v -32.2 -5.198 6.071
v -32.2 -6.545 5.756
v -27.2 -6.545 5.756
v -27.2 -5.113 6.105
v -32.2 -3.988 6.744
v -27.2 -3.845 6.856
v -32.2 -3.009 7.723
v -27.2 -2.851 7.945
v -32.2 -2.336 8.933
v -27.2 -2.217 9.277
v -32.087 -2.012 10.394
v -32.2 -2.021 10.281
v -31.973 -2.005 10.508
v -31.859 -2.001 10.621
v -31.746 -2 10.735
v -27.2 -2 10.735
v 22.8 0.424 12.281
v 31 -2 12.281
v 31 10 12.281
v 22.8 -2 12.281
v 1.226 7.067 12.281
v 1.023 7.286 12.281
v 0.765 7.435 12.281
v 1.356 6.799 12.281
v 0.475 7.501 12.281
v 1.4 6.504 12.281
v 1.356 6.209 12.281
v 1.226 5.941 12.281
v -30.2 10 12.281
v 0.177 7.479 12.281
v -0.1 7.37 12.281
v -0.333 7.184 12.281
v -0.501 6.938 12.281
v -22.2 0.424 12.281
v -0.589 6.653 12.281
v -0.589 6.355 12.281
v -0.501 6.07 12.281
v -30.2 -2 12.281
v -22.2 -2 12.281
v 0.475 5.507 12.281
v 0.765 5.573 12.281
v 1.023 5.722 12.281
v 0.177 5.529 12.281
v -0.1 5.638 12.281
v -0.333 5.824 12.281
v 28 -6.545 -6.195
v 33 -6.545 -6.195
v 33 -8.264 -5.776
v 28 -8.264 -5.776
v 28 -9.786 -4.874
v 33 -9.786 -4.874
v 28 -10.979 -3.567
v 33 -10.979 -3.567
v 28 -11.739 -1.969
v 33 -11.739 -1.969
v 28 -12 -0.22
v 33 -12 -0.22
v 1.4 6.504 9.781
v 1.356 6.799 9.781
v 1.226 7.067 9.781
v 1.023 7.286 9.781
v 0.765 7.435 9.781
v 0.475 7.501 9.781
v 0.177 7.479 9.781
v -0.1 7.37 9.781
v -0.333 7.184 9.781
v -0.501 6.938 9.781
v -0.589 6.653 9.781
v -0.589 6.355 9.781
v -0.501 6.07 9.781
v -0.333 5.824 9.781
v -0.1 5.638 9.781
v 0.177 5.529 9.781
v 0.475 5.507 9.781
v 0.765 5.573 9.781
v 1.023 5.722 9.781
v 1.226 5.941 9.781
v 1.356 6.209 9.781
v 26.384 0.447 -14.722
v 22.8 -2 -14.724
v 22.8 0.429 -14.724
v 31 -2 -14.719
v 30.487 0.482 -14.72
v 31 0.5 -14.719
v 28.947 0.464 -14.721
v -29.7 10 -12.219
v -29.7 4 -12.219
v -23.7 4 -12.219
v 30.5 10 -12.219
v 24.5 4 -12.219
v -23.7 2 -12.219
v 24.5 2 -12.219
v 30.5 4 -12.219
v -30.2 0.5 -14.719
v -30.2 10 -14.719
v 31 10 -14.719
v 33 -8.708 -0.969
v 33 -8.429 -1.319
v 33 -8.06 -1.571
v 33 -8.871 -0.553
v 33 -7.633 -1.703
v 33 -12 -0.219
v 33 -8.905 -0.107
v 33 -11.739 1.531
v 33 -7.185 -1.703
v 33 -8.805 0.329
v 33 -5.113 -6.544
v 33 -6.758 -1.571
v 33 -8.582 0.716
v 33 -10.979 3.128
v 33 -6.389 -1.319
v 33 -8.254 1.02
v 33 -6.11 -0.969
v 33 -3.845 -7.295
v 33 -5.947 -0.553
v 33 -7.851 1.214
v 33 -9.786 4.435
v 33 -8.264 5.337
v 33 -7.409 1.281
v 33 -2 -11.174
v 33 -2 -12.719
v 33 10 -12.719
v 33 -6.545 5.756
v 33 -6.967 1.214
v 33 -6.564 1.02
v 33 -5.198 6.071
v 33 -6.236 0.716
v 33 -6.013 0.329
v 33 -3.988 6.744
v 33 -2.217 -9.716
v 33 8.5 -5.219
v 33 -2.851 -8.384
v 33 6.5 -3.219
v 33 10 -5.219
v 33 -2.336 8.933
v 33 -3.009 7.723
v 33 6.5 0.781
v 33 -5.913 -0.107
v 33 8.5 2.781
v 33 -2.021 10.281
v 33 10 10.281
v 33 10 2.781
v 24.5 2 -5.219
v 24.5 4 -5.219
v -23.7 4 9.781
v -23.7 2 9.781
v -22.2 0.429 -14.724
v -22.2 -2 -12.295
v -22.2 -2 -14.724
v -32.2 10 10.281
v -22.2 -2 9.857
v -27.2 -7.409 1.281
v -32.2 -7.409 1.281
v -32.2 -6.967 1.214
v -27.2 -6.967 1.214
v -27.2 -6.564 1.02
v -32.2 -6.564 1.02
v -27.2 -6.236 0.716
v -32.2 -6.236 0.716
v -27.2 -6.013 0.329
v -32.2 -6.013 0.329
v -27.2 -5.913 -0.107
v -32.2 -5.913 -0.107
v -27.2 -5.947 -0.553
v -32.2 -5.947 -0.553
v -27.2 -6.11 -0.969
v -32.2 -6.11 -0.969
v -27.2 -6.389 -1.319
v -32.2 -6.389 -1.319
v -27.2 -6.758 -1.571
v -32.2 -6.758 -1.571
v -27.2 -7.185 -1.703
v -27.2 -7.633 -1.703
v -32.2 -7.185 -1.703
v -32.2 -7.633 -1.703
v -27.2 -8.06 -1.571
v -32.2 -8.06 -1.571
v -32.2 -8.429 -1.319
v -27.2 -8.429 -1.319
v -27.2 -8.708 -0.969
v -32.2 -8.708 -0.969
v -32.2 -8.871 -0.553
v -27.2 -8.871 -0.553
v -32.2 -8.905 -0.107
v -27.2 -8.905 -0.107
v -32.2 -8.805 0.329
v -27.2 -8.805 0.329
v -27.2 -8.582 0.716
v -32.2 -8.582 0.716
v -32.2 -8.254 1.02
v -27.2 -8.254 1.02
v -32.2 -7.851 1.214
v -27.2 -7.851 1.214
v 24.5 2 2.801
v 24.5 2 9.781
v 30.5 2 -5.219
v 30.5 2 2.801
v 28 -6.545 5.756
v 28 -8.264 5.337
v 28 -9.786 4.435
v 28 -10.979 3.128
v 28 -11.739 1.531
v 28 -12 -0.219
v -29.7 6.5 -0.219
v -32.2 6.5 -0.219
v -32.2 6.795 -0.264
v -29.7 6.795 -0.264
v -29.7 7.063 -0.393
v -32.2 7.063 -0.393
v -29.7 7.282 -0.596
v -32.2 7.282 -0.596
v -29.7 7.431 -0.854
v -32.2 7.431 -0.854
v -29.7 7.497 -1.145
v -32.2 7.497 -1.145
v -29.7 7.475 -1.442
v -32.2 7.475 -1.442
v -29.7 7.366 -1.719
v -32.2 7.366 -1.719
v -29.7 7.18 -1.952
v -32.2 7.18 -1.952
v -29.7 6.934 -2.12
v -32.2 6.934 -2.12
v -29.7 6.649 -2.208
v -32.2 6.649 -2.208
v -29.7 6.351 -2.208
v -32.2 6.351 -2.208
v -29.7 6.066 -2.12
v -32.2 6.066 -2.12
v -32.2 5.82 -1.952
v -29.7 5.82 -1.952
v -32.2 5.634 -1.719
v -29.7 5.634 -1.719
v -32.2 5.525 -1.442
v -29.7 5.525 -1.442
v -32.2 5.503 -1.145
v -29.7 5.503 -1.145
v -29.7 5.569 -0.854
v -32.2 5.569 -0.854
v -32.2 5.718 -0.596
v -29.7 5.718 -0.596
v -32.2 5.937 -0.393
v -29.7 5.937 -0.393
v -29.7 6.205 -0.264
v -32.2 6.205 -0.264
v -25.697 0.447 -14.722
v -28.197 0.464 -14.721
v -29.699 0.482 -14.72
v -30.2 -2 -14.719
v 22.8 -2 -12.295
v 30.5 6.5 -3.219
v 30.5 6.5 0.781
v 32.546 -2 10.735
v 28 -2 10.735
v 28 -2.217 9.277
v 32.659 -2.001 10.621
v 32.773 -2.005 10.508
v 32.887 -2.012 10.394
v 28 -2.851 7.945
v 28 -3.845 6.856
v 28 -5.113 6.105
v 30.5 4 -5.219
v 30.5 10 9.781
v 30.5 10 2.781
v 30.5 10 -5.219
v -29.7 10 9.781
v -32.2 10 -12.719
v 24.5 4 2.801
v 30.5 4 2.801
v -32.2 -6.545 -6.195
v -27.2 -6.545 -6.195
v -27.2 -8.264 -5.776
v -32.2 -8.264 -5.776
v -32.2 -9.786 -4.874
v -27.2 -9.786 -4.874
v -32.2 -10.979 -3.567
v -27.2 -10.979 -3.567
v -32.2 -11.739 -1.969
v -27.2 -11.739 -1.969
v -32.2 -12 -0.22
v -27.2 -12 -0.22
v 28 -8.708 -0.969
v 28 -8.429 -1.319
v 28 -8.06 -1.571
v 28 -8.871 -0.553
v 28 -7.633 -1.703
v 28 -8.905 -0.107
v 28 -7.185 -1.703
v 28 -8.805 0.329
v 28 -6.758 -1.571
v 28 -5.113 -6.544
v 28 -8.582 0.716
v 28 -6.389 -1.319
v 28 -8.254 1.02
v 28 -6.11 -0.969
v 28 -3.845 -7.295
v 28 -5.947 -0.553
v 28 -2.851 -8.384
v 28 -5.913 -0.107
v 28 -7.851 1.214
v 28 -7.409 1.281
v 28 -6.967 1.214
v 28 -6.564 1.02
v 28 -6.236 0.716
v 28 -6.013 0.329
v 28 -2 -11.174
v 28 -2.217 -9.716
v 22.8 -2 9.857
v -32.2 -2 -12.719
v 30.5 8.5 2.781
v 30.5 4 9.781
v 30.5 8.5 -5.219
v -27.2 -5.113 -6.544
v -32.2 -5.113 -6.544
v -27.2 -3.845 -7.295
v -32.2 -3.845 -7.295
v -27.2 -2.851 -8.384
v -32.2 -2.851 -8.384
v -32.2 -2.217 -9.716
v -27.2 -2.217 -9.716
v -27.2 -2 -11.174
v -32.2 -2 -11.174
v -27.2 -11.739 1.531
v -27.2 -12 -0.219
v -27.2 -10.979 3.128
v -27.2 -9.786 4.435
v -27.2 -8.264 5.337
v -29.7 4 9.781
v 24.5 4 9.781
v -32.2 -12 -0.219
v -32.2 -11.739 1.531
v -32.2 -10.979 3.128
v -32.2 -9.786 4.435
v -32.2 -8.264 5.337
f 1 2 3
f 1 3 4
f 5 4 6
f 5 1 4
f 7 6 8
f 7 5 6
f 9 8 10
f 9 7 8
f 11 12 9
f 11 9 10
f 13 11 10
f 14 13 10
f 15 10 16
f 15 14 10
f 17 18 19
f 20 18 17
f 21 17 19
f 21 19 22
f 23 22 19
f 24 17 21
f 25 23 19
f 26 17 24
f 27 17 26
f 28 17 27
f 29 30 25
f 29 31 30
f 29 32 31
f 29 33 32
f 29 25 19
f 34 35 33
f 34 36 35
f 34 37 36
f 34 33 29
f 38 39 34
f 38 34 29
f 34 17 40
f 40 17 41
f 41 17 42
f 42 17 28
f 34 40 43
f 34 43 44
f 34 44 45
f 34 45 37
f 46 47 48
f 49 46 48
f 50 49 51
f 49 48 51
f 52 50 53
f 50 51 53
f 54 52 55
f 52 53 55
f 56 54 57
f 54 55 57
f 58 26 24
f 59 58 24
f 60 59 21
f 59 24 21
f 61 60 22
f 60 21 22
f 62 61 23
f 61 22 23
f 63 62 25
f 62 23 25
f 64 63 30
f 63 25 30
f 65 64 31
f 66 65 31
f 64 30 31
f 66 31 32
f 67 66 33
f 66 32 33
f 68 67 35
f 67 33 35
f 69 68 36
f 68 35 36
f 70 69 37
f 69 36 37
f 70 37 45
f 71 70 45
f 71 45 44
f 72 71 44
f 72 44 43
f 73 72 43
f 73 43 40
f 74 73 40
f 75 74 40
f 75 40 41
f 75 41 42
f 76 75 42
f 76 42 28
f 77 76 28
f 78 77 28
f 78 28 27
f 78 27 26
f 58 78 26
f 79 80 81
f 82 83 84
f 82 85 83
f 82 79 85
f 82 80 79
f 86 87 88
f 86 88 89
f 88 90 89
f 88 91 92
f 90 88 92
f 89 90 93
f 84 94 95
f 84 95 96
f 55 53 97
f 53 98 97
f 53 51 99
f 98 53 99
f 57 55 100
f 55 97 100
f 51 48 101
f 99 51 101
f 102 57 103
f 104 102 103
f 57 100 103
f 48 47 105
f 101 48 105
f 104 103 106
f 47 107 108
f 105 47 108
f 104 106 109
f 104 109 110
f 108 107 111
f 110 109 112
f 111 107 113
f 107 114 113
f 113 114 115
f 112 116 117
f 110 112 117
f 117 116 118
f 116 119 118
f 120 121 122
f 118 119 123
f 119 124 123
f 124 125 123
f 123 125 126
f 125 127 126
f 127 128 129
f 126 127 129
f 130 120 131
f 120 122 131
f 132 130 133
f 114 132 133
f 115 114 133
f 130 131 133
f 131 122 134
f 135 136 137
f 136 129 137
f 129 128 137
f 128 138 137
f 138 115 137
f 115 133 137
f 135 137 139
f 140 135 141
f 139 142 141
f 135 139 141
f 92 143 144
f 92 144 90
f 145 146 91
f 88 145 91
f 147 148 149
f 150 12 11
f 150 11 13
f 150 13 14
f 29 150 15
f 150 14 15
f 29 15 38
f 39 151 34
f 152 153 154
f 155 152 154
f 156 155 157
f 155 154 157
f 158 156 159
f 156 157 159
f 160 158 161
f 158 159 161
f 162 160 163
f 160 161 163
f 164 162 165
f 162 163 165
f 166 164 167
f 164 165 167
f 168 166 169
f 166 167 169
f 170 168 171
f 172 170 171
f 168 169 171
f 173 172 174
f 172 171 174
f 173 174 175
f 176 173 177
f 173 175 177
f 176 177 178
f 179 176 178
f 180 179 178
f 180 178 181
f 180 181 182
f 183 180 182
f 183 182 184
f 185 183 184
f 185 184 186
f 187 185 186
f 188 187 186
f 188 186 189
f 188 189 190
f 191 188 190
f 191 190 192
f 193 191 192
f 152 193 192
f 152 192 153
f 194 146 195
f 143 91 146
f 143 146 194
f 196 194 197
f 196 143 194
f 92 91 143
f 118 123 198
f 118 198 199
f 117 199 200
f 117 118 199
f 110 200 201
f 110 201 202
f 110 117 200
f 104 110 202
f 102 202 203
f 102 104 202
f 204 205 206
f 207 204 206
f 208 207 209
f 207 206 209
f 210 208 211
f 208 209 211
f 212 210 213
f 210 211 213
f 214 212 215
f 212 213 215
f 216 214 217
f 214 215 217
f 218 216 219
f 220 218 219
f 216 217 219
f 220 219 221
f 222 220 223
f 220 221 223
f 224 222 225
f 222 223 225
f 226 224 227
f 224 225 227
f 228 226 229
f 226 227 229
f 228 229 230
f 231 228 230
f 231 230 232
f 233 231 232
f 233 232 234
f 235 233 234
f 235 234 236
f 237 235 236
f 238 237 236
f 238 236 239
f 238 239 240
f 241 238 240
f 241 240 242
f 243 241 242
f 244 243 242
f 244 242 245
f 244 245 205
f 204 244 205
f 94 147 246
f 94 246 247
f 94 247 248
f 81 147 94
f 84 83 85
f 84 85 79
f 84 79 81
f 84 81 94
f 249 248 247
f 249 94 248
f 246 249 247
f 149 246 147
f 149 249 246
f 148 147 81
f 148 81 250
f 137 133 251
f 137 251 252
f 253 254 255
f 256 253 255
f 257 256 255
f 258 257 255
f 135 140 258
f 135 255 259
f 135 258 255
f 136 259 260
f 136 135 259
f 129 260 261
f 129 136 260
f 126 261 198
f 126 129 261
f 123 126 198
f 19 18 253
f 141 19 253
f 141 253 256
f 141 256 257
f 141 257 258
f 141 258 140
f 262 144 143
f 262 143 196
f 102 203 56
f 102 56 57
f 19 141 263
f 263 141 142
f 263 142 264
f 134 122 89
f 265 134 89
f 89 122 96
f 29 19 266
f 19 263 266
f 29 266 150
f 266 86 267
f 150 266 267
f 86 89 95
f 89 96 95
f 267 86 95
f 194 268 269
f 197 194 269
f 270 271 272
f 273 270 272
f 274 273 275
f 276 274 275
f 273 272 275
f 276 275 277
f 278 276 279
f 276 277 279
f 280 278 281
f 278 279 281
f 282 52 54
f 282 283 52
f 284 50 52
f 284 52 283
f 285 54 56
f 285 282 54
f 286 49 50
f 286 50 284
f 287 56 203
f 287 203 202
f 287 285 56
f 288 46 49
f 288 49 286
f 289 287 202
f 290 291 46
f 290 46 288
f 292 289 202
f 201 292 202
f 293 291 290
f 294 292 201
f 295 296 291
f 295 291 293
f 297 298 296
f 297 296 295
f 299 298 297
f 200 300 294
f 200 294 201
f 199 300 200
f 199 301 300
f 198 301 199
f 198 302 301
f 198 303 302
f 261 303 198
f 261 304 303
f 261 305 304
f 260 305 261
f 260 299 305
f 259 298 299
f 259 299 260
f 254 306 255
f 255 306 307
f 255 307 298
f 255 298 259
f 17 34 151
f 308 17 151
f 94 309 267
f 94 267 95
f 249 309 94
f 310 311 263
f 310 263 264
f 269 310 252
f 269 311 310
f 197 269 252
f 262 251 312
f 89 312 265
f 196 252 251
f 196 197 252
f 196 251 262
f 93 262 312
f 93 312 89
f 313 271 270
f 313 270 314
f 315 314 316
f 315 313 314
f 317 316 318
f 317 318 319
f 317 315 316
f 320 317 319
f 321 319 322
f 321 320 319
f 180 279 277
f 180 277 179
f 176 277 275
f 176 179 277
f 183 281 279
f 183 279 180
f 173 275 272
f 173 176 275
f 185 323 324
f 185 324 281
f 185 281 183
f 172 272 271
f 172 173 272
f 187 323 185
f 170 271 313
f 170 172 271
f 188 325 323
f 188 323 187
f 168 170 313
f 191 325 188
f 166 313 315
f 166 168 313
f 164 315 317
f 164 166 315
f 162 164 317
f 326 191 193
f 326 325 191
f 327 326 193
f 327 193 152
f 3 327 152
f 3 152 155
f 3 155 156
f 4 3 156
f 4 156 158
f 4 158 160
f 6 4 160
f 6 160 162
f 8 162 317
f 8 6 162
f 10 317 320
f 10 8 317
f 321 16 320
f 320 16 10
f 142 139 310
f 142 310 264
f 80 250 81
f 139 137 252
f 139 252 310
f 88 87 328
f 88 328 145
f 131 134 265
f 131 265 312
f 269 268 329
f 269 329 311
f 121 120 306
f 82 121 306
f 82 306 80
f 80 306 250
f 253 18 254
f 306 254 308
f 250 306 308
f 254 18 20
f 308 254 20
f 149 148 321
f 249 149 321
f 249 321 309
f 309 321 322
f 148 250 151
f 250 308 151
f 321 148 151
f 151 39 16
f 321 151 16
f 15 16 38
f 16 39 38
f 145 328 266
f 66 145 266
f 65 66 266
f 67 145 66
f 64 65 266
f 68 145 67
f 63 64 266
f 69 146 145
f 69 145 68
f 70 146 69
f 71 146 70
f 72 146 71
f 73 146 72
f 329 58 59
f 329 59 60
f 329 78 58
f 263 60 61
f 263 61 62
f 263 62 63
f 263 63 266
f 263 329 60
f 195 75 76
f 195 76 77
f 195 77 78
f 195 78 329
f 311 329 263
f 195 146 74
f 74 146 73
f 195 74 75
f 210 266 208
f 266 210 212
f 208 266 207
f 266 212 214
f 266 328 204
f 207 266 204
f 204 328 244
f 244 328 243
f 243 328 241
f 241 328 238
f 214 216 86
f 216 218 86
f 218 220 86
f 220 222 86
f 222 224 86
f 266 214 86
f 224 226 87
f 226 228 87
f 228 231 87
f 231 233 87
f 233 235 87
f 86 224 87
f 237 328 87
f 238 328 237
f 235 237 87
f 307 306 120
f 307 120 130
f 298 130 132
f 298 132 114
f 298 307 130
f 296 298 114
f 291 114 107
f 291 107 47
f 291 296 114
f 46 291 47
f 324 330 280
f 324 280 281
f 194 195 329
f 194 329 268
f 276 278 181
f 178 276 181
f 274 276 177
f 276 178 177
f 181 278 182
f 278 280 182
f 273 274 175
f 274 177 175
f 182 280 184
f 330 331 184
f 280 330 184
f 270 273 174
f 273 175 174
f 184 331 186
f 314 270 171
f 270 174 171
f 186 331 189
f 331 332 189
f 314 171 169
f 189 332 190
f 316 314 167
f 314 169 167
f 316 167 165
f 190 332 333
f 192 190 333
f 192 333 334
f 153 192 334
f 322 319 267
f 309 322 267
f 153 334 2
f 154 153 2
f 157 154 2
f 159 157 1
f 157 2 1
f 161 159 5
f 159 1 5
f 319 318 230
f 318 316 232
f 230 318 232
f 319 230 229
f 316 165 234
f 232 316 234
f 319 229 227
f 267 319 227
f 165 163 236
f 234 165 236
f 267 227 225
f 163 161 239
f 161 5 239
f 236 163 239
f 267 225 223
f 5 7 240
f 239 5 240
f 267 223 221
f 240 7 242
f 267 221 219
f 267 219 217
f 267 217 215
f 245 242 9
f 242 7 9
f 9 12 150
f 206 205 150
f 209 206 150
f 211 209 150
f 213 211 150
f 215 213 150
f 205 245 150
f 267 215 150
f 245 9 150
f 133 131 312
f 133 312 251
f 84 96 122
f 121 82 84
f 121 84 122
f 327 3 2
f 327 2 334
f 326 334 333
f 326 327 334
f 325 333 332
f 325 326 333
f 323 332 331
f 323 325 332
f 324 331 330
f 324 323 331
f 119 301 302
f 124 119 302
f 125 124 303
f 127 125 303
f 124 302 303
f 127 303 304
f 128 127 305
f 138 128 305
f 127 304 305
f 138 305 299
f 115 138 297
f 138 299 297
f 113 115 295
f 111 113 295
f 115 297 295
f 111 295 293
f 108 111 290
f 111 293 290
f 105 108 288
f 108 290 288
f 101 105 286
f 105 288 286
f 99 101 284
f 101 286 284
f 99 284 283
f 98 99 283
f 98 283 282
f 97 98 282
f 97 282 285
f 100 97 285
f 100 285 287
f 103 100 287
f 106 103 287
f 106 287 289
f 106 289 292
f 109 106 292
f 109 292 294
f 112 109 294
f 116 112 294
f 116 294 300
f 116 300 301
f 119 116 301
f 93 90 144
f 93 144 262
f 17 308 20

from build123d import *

# Parameters (mm, degrees)
SKETCH1_W                = 60.2
SKETCH1_H                = 22
BOSS_EXTRUDE1_DEPTH      = 10
SKETCH1_3_W              = 60.2
SKETCH1_3_H              = 22
BOSS_EXTRUDE2_DEPTH      = 2
SKETCH2_W                = 6
SKETCH2_H                = 22
BOSS_EXTRUDE3_DEPTH      = 2
BOSS_EXTRUDE4_DEPTH      = 2
FILLET1_R                = 0.5
CUT_EXTRUDE1_DEPTH       = 10.5
SKETCH5_W                = 5
SKETCH5_H                = 9
BOSS_EXTRUDE5_DEPTH      = 5
SKETCH7_W                = 3.5
SKETCH7_H                = 5
SKETCH7_W_2              = 2.5
CUT_EXTRUDE3_DEPTH       = 5
CUT_EXTRUDE4_REACH       = 52.1
CUT_EXTRUDE5_REACH       = 52.1
SKETCH11_R               = 1.5
CUT_EXTRUDE6_START       = -10
CUT_EXTRUDE6_DEPTH       = 45
SKETCH13_W               = 6
SKETCH13_H               = 8.020209914
CUT_EXTRUDE7_DEPTH       = 2
SKETCH19_R               = 1
CUT_EXTRUDE9_DEPTH       = 6
SKETCH20_R               = 1
CUT_EXTRUDE10_DEPTH      = 6
CUT_EXTRUDE13_DEPTH      = 23
CUT_EXTRUDE13_DEPTH_BACK = 23
SKETCH24_W               = 5
SKETCH24_H               = 12
BOSS_EXTRUDE6_DEPTH      = 10
FILLET2_R                = 6
SKETCH25_R               = 1.5
CUT_EXTRUDE14_DEPTH      = 68.910603458
FILLET3_R                = 5


# Some blends are built 0.0001 mm under size
with BuildPart() as part:
    # Sketch1 → Boss-Extrude1 (new body)
    with BuildSketch(Plane(origin=(0, 0, 0), x_dir=(1, 0, 0), z_dir=(0, 1, 0))):
        Polygon((-30.2, 14.719403234), (31, 14.719403234), (33, 12.719403234), (33, -10.280596766), (31, -12.280596766), (-30.2, -12.280596766), (-32.2, -10.280596766), (-32.2, 12.719403234), align=None)
        with Locations((0.4, 1.219403234)):
            Rectangle(SKETCH1_W, SKETCH1_H, mode=Mode.SUBTRACT)
    extrude(amount=BOSS_EXTRUDE1_DEPTH)

    # Sketch1<3> → Boss-Extrude2 (add)
    # profile 1 of 2: a face of its own
    with BuildSketch(Plane(origin=(0, 0, 0), x_dir=(1, 0, 0), z_dir=(0, 1, 0))):
        with Locations((0.4, 1.219403234)):
            Rectangle(SKETCH1_3_W, SKETCH1_3_H)
        with BuildLine():
            Line((19, 11.719403234), (19, 4.719403234))
            ThreePointArc((19, 4.719403234), (21, 2.719403234), (23, 4.719403234))
            Line((23, 4.719403234), (23, 8.719403234))
            Line((23, 8.719403234), (27.74387368, 8.719403234))
            Line((27.74387368, 8.719403234), (29, 7.463276914))
            Line((29, 7.463276914), (29, -6.35040845))
            Line((29, -6.35040845), (21, -9.280596766))
            Line((21, -9.280596766), (-19, -9.280596766))
            Line((-19, -9.280596766), (-29, -3.280596766))
            Line((-29, -3.280596766), (-29, 6.719403234))
            Line((-29, 6.719403234), (-19, 11.719403234))
            Line((-19, 11.719403234), (-10, 11.719403234))
            Line((-10, 11.719403234), (-9.484452133, 10.971768721))
            ThreePointArc((-9.484452133, 10.971768721), (-9.305293031, 10.812937389), (-9.07282975, 10.755612013))
            Line((-9.07282975, 10.755612013), (-6.967125689, 10.755612013))
            ThreePointArc((-6.967125689, 10.755612013), (-6.742443017, 10.808937974), (-6.565686023, 10.957541226))
            Line((-6.565686023, 10.957541226), (-6, 11.719403234))
            Line((-6, 11.719403234), (19, 11.719403234))
        make_face(mode=Mode.SUBTRACT)
    # profile 2 of 2: a face of its own
    with BuildSketch(Plane(origin=(0, 0, 0), x_dir=(1, 0, 0), z_dir=(0, 1, 0))):
        with BuildLine():
            ThreePointArc((19, 4.719403234), (21, 2.719403234), (23, 4.719403234))
            Line((23, 4.719403234), (23, 8.719403234))
            Line((23, 8.719403234), (27.74387368, 8.719403234))
            Line((27.74387368, 8.719403234), (29, 7.463276914))
            Line((29, 7.463276914), (29, -6.35040845))
            Line((29, -6.35040845), (21, -9.280596766))
            Line((21, -9.280596766), (-19, -9.280596766))
            Line((-19, -9.280596766), (-29, -3.280596766))
            Line((-29, -3.280596766), (-29, 6.719403234))
            Line((-29, 6.719403234), (-19, 11.719403234))
            Line((-19, 11.719403234), (-10, 11.719403234))
            Line((-10, 11.719403234), (-9.484452133, 10.971768721))
            ThreePointArc((-9.484452133, 10.971768721), (-9.305293031, 10.812937389), (-9.07282975, 10.755612013))
            Line((-9.07282975, 10.755612013), (-6.967125689, 10.755612013))
            ThreePointArc((-6.967125689, 10.755612013), (-6.742443017, 10.808937974), (-6.565686023, 10.957541226))
            Line((-6.565686023, 10.957541226), (-6, 11.719403234))
            Line((-6, 11.719403234), (19, 11.719403234))
            Line((19, 11.719403234), (19, 4.719403234))
        make_face()
    extrude(amount=BOSS_EXTRUDE2_DEPTH)

    # Sketch2 → Boss-Extrude3 (add)
    with BuildSketch(Plane(origin=(0, 2, 0), x_dir=(1, 0, 0), z_dir=(0, 1, 0))):
        with Locations((-26.7, 1.219403234)):
            Rectangle(SKETCH2_W, SKETCH2_H)
        with Locations((27.5, 1.219403234)):
            Rectangle(SKETCH2_W, SKETCH2_H)
    extrude(amount=BOSS_EXTRUDE3_DEPTH)

    # Sketch3 → Boss-Extrude4 (add)
    with BuildSketch(Plane.XZ):
        Polygon((-32.2, 14.280596766), (36, 14.280596766), (41, 9.280596766), (41, -11.719403234), (36, -16.719403234), (-32.2, -16.719403234), (-37.2, -11.719403234), (-37.2, 9.280596766), align=None)
    extrude(amount=BOSS_EXTRUDE4_DEPTH)

    # Fillet1
    fillet1_edges = [part.edges().sort_by_distance(p)[0] for p in [
        (0.4, 0, -14.719403234),
        (32, 0, -13.719403234),
    ]]
    fillet(fillet1_edges, radius=FILLET1_R)

    # Sketch4 → Cut-Extrude1 (cut)
    with BuildSketch(Plane(origin=(33, 0, 0), x_dir=(0, 0, -1), z_dir=(1, 0, 0))):
        Polygon((-2.780596766, 10), (5.219403234, 10), (5.219403234, 8.5), (3.219403234, 6.5), (-0.780596766, 6.5), (-2.780596766, 8.5), align=None)
    extrude(amount=-CUT_EXTRUDE1_DEPTH, mode=Mode.SUBTRACT)

    # Sketch5 → Boss-Extrude5 (add)
    with BuildSketch(Plane(origin=(0, 0, 0), x_dir=(-1, 0, 0), z_dir=(0, 1, 0))):
        with Locations((-35.5, 9.280596766)):
            Rectangle(SKETCH5_W, SKETCH5_H)
        with Locations((-35.5, -9.719403234)):
            Rectangle(SKETCH5_W, SKETCH5_H)
    extrude(amount=BOSS_EXTRUDE5_DEPTH)

    # Sketch7 → Cut-Extrude3 (cut)
    with BuildSketch(Plane(origin=(38, 0, 0), x_dir=(0, 0, -1), z_dir=(1, 0, 0))):
        with Locations((-12.030596766, 2.5)):
            Rectangle(SKETCH7_W, SKETCH7_H)
        with Locations((13.969403234, 2.5)):
            Rectangle(SKETCH7_W_2, SKETCH7_H)
    extrude(amount=-CUT_EXTRUDE3_DEPTH, mode=Mode.SUBTRACT)

    # Sketch10 → Cut-Extrude4 (cut, up to next)
    with BuildSketch(Plane(origin=(0, 0, -12.719403234), x_dir=(-1, 0, 0), z_dir=(0, 0, -1)), mode=Mode.PRIVATE) as cut_extrude4_sk1:
        with BuildLine():
            Line((-35.5, 5), (-38, 5))
            Line((-38, 5), (-38, 2.5))
            ThreePointArc((-38, 2.5), (-37.267766953, 4.267766953), (-35.5, 5))
        make_face()
    cut_extrude4_tool1 = extrude(cut_extrude4_sk1.sketch, amount=-CUT_EXTRUDE4_REACH, mode=Mode.PRIVATE) & part.part
    # Sketch10 → Cut-Extrude4 (cut, up to next)
    with BuildSketch(Plane(origin=(0, 0, -12.719403234), x_dir=(-1, 0, 0), z_dir=(0, 0, -1)), mode=Mode.PRIVATE) as cut_extrude4_sk2:
        with BuildLine():
            ThreePointArc((-35.5, 0), (-37.267766953, 0.732233047), (-38, 2.5))
            Line((-38, 2.5), (-38, 0))
            Line((-38, 0), (-35.5, 0))
        make_face()
    cut_extrude4_tool2 = extrude(cut_extrude4_sk2.sketch, amount=-CUT_EXTRUDE4_REACH, mode=Mode.PRIVATE) & part.part
    add(cut_extrude4_tool1.solids().sort_by_distance((37.44158, 4.44158, -12.719403))[0], mode=Mode.SUBTRACT)
    add(cut_extrude4_tool1.solids().sort_by_distance((37.44158, 4.44158, -12.719403))[1], mode=Mode.SUBTRACT)
    add(cut_extrude4_tool2.solids().sort_by_distance((37.44158, 0.55842, -12.719403))[0], mode=Mode.SUBTRACT)
    add(cut_extrude4_tool2.solids().sort_by_distance((37.44158, 0.55842, -12.719403))[1], mode=Mode.SUBTRACT)

    # Cut-Extrude5: up to this face of the body (flat: up to its plane)
    cut_extrude5_end = Plane(part.part.faces().sort_by_distance((35.266625353, 2.5, 10.280596766))[0])
    # Sketch11 → Cut-Extrude5 (cut, up to the picked face)
    with BuildSketch(Plane(origin=(0, 0, -12.719403234), x_dir=(-1, 0, 0), z_dir=(0, 0, -1)), mode=Mode.PRIVATE) as cut_extrude5_sk1:
        with Locations((-35.5, 2.5)):
            Circle(SKETCH11_R)
    cut_extrude5_tool1 = split(extrude(cut_extrude5_sk1.sketch, amount=-CUT_EXTRUDE5_REACH, mode=Mode.PRIVATE), bisect_by=cut_extrude5_end, keep=Keep.BOTH, mode=Mode.PRIVATE)
    add(cut_extrude5_tool1.solids().sort_by(Axis((35.5, 2.5, -12.719403), (0, 0, 1)))[0], mode=Mode.SUBTRACT)

    # Sketch12 → Cut-Extrude6 (cut)
    with BuildSketch(Plane.ZY.offset(32.2).offset(CUT_EXTRUDE6_START)):
        Polygon((14.280596766, -2), (14.280596766, 2.423920323), (9.856676443, -2), align=None)
        Polygon((-12.295482911, -2), (-16.719403234, -2), (-16.719403234, 2.423920323), align=None)
    extrude(amount=-CUT_EXTRUDE6_DEPTH, mode=Mode.SUBTRACT)

    # Sketch13 → Cut-Extrude7 (cut)
    with BuildSketch(Plane(origin=(0, 4, 0), x_dir=(1, 0, 0), z_dir=(0, 1, 0))):
        with Locations((27.5, 1.209298277)):
            Rectangle(SKETCH13_W, SKETCH13_H)
    extrude(amount=-CUT_EXTRUDE7_DEPTH, mode=Mode.SUBTRACT)

    # Sketch19 → Cut-Extrude9 (cut)
    with BuildSketch(Plane.ZY.offset(32.2)):
        with Locations((-1.219403234, 6.5)):
            Circle(SKETCH19_R)
    extrude(amount=-CUT_EXTRUDE9_DEPTH, mode=Mode.SUBTRACT)

    # Sketch20 → Cut-Extrude10 (cut)
    with BuildSketch(Plane.XY.offset(12.280596766)):
        with Locations((0.4, 6.503920323)):
            Circle(SKETCH20_R)
    extrude(amount=-CUT_EXTRUDE10_DEPTH, mode=Mode.SUBTRACT)

    # Sketch21 → Cut-Extrude13 (cut, two sides: drawn at the far end of the back side and taken through both)
    with BuildSketch(Plane(origin=(0, 0, 0), x_dir=(1, 0, 0), z_dir=(0, 1, 0)).offset(-CUT_EXTRUDE13_DEPTH_BACK)):
        Polygon((-32.2, -14.280596766), (-22.2, -14.280596766), (-22.2, -12.280596766), (-30.2, -12.280596766), (-32.2, -10.280596766), (-32.2, 12.719403234), (-29.7, 15.219403234), (-22.2, 15.219403234), (-22.2, 16.719403234), (-32.2, 16.719403234), (-37.2, 11.719403234), (-37.2, -9.280596766), align=None)
        Polygon((-22.2, 14.724471537), (-22.2, 15.219403234), (-29.7, 15.219403234), (-30.2, 14.719403234), align=None)
        Polygon((33, 12.719403234), (33, -10.280596766), (31, -12.280596766), (22.8, -12.280596766), (22.8, -14.280596766), (36, -14.280596766), (41, -9.280596766), (41, 11.719403234), (36, 16.719403234), (22.8, 16.719403234), (22.8, 15.219403234), (22.8, 14.724471537), (31, 14.719403234), align=None)
    extrude(amount=CUT_EXTRUDE13_DEPTH + CUT_EXTRUDE13_DEPTH_BACK, mode=Mode.SUBTRACT)

    # Sketch24 → Boss-Extrude6 (add)
    with BuildSketch(Plane.XZ.offset(2)):
        with Locations((-29.7, -0.219403234)):
            Rectangle(SKETCH24_W, SKETCH24_H)
        with Locations((30.5, -0.219403234)):
            Rectangle(SKETCH24_W, SKETCH24_H)
    extrude(amount=BOSS_EXTRUDE6_DEPTH)

    # Fillet2
    fillet2_edges = [part.edges().sort_by_distance(p)[0] for p in [
        (30.5, -12, -6.219403234),
        (30.5, -12, 5.780596766),
        (-29.7, -12, 5.780596766),
        (-29.7, -12, -6.219403234),
    ]]
    fillet(fillet2_edges, radius=FILLET2_R - 0.0001)  # a hair under: the kernel refuses the full size

    # Sketch25 → Cut-Extrude14 (cut, through all)
    with BuildSketch(Plane.ZY.offset(32.2)):
        with Locations((-0.219403234, -7.409023834)):
            Circle(SKETCH25_R)
    extrude(amount=-CUT_EXTRUDE14_DEPTH, mode=Mode.SUBTRACT)

    # Fillet3
    # the kernel refuses this fillet: 5 mm, written as the material it adds along each edge
    with BuildSketch(Plane(origin=(33, -2, 5.780596766), x_dir=(0, 0, 1), z_dir=(-1, 0, 0))) as fillet3_piece_1_section:
        with BuildLine():
            CenterArc((4.954459863, -5), FILLET3_R, 90, 84.784566921)
            Line((-0.024839887, -4.545495868), (-0.522769862, -4.500045455))
            ThreePointArc((-0.522769862, -4.500045455), (-0.5, -4.0001), (-0.5, 0))
            Line((-0.5, 0), (0, 0.5))
            Line((0, 0.5), (4.954459863, 0.5))
            Line((4.954459863, 0.5), (4.954459863, 0))
        make_face()
    fillet3_piece_1 = extrude(amount=5, mode=Mode.PRIVATE)
    fillet3_piece_1 = split(fillet3_piece_1, bisect_by=Plane(origin=(31.767986463, -2.014062206, 11.512610303), z_dir=(-0.7071067811865495, 0, -0.7071067811865457)), keep=Keep.TOP, mode=Mode.PRIVATE)
    add(fillet3_piece_1)
    with BuildSketch(Plane(origin=(-32.2, -2, 5.780596766), x_dir=(0, 0, 1), z_dir=(1, 0, 0))) as fillet3_piece_2_section:
        with BuildLine():
            CenterArc((4.954459863, 5), FILLET3_R, 185.215433079, 84.784566921)
            Line((-0.024839887, 4.545495868), (-0.522769862, 4.500045455))
            ThreePointArc((-0.522769862, 4.500045455), (-0.5, 4.0001), (-0.5, 0))
            Line((-0.5, 0), (0, -0.5))
            Line((0, -0.5), (4.954459863, -0.5))
            Line((4.954459863, -0.5), (4.954459863, 0))
        make_face()
    fillet3_piece_2 = extrude(amount=5, mode=Mode.PRIVATE)
    fillet3_piece_2 = split(fillet3_piece_2, bisect_by=Plane(origin=(-30.967986463, -2.014062206, 11.512610303), z_dir=(0.7071067811865481, 0, -0.7071067811865469)), keep=Keep.TOP, mode=Mode.PRIVATE)
    add(fillet3_piece_2)
    with BuildSketch(Plane(origin=(-27.2, -2, -6.219403234), x_dir=(0, -0.99998506872255, 0.005464643808789093), z_dir=(-1, 0, 0))) as fillet3_piece_3:
        with BuildLine():
            CenterArc((4.972850985, -4.981709105), FILLET3_R, 94.902330493, 84.784566921)
            Line((-0.027074358, -4.954385886), (-0.527066893, -4.951653564))
            Line((-0.527066893, -4.951653564), (-0.499992534, 0.002732322))
            Line((-0.499992534, 0.002732322), (0.002732322, 0.499992534))
            ThreePointArc((0.002732322, 0.499992534), (4.002772595, 0.478133413), (4.502835015, 0.498170911))
            Line((4.502835015, 0.498170911), (4.545563739, 0))
        make_face()
    extrude(amount=5)
    with BuildSketch(Plane(origin=(28, -2, -6.219403234), x_dir=(0, 0, -1), z_dir=(1, 0, 0))) as fillet3_piece_4:
        with BuildLine():
            CenterArc((4.954459863, -5), FILLET3_R, 90, 84.784566921)
            Line((-0.024839887, -4.545495868), (-0.522769862, -4.500045455))
            ThreePointArc((-0.522769862, -4.500045455), (-0.5, -4.0001), (-0.5, 0))
            Line((-0.5, 0), (0, 0.5))
            Line((0, 0.5), (4.954459863, 0.5))
            Line((4.954459863, 0.5), (4.954459863, 0))
        make_face()
    extrude(amount=5)


solid = part.part
